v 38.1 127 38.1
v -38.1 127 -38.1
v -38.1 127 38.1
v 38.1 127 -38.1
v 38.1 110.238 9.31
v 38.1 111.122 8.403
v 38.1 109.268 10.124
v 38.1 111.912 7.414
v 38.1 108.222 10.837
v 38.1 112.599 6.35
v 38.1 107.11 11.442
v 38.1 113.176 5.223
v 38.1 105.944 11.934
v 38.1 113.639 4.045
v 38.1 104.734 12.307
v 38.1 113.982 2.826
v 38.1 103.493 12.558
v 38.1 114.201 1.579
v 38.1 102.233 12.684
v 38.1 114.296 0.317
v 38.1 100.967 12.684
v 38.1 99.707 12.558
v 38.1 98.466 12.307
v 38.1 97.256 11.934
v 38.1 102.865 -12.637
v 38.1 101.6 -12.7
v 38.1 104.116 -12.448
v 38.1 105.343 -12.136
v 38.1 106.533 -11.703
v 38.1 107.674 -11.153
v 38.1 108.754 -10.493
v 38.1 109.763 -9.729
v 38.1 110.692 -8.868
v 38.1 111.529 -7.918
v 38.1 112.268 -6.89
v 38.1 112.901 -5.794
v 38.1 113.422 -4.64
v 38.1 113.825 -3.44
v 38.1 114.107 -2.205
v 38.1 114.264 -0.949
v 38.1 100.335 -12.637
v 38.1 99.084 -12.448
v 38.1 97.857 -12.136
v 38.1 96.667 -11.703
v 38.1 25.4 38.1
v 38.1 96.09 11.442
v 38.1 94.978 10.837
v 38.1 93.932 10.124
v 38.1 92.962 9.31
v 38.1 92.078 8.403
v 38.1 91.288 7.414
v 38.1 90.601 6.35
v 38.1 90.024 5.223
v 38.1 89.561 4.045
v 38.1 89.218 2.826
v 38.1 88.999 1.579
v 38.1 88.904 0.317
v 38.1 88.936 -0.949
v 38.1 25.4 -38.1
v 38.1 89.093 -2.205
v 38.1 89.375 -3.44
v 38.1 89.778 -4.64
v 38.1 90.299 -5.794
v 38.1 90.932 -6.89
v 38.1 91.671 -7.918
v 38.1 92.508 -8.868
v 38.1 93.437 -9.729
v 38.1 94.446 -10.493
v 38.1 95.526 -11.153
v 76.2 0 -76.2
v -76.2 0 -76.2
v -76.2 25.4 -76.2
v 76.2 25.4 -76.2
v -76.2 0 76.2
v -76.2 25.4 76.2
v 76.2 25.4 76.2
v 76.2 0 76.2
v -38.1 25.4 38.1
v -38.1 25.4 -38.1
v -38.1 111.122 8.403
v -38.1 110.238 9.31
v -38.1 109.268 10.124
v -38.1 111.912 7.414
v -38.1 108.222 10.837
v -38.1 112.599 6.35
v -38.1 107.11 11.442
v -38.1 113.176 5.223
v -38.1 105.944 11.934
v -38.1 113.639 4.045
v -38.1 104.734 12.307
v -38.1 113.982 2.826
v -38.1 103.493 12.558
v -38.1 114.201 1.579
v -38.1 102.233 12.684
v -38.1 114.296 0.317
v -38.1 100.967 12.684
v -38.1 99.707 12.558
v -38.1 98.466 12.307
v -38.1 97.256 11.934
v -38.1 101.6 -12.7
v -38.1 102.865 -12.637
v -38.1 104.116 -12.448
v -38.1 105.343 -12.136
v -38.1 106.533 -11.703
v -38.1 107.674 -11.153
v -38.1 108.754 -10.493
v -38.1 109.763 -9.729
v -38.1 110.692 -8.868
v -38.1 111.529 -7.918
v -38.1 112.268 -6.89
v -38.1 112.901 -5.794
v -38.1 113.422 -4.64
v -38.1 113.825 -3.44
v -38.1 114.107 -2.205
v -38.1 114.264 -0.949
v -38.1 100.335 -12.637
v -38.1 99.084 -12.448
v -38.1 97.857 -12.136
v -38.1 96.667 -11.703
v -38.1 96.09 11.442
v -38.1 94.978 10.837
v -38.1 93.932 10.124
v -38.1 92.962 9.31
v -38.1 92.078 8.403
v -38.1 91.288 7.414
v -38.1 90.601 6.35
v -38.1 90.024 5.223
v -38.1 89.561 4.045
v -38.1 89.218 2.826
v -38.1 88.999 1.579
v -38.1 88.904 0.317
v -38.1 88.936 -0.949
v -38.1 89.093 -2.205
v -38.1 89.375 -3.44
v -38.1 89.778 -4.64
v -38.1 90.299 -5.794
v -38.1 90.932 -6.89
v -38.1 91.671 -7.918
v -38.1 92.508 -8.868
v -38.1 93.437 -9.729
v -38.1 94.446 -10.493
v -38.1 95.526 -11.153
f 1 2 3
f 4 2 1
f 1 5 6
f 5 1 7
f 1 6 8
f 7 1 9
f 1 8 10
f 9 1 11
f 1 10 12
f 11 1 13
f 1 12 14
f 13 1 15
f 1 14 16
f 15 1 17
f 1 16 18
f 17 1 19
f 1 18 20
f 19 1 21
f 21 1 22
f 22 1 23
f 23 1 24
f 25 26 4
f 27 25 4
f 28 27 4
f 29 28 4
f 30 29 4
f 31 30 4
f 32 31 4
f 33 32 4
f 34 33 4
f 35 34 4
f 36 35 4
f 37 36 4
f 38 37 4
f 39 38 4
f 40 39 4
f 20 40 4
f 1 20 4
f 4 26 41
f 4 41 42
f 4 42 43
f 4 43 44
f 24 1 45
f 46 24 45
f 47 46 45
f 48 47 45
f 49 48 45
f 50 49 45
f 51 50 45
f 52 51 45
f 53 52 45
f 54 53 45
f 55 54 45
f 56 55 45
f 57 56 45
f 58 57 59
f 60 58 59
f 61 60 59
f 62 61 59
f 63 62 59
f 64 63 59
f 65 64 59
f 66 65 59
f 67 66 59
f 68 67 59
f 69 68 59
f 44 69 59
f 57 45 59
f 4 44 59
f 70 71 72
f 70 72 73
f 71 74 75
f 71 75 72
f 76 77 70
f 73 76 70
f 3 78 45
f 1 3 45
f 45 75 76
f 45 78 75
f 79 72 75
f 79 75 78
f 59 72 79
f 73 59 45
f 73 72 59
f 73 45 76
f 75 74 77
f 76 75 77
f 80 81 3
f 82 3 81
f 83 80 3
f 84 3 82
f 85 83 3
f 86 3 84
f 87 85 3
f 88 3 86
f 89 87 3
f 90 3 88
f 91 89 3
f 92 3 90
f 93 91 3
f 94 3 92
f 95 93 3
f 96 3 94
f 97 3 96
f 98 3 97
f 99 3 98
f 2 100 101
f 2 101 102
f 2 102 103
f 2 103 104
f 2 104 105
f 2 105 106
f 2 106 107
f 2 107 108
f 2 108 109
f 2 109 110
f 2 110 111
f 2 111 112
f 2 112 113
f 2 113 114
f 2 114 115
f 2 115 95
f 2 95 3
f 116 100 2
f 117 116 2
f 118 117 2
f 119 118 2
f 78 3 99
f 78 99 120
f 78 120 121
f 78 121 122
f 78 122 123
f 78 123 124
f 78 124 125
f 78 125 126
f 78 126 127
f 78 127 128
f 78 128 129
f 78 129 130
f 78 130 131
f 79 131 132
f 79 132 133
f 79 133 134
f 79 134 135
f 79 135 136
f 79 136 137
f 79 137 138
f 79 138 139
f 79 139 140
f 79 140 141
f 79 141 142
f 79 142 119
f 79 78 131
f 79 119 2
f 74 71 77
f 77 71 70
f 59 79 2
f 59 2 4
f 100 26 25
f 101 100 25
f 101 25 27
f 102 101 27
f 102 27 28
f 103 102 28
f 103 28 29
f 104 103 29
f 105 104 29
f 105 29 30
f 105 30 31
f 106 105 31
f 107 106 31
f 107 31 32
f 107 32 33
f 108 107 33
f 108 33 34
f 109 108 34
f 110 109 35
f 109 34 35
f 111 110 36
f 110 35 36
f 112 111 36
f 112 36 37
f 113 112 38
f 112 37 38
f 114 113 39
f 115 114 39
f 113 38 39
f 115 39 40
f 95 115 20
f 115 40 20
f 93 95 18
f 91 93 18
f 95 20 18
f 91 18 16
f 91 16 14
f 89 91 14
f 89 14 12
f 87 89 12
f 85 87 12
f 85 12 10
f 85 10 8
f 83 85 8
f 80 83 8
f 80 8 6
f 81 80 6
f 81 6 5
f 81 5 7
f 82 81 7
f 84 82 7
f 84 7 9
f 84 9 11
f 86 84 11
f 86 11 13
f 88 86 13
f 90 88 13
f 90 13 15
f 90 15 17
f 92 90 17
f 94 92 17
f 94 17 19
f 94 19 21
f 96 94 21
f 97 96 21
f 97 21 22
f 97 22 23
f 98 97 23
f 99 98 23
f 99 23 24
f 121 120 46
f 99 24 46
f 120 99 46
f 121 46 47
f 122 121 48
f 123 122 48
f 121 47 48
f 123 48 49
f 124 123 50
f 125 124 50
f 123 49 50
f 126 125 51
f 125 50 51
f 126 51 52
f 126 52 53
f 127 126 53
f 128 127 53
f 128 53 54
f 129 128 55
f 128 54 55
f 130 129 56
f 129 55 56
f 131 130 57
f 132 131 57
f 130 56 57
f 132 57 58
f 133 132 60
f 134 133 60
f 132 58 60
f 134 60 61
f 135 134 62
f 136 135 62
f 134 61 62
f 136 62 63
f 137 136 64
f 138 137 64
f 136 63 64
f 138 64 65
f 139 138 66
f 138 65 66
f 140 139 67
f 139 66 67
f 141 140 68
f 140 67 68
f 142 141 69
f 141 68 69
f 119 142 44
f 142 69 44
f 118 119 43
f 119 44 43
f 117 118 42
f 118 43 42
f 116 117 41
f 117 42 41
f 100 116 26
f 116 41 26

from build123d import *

# Parameters (mm, degrees)
SKETCH1_W           = 152.4
SKETCH1_H           = 152.4
BOSS_EXTRUDE1_DEPTH = 25.4
SKETCH2_W           = 76.2
SKETCH2_H           = 76.2
BOSS_EXTRUDE2_DEPTH = 101.6
CUT_EXTRUDE1_REACH  = 189.083
SKETCH3_R           = 12.7


with BuildPart() as part:
    # Sketch1 → Boss-Extrude1 (new body)
    with BuildSketch(Plane(origin=(0, 0, 0), x_dir=(1, 0, 0), z_dir=(0, 1, 0))):
        Rectangle(SKETCH1_W, SKETCH1_H)
    extrude(amount=BOSS_EXTRUDE1_DEPTH)

    # Sketch2 → Boss-Extrude2 (add)
    with BuildSketch(Plane(origin=(0, 25.4, 0), x_dir=(1, 0, 0), z_dir=(0, 1, 0))):
        Rectangle(SKETCH2_W, SKETCH2_H)
    extrude(amount=BOSS_EXTRUDE2_DEPTH)

    # Sketch3 → Cut-Extrude1 (cut, up to next)
    with BuildSketch(Plane(origin=(38.1, 0, 0), x_dir=(0, 0, -1), z_dir=(1, 0, 0)), mode=Mode.PRIVATE) as cut_extrude1_sk1:
        with Locations((0, 101.6)):
            Circle(SKETCH3_R)
    cut_extrude1_tool1 = extrude(cut_extrude1_sk1.sketch, amount=-CUT_EXTRUDE1_REACH, mode=Mode.PRIVATE) & part.part
    add(cut_extrude1_tool1.solids().sort_by_distance((38.1, 101.6, 0))[0], mode=Mode.SUBTRACT)


solid = part.part
